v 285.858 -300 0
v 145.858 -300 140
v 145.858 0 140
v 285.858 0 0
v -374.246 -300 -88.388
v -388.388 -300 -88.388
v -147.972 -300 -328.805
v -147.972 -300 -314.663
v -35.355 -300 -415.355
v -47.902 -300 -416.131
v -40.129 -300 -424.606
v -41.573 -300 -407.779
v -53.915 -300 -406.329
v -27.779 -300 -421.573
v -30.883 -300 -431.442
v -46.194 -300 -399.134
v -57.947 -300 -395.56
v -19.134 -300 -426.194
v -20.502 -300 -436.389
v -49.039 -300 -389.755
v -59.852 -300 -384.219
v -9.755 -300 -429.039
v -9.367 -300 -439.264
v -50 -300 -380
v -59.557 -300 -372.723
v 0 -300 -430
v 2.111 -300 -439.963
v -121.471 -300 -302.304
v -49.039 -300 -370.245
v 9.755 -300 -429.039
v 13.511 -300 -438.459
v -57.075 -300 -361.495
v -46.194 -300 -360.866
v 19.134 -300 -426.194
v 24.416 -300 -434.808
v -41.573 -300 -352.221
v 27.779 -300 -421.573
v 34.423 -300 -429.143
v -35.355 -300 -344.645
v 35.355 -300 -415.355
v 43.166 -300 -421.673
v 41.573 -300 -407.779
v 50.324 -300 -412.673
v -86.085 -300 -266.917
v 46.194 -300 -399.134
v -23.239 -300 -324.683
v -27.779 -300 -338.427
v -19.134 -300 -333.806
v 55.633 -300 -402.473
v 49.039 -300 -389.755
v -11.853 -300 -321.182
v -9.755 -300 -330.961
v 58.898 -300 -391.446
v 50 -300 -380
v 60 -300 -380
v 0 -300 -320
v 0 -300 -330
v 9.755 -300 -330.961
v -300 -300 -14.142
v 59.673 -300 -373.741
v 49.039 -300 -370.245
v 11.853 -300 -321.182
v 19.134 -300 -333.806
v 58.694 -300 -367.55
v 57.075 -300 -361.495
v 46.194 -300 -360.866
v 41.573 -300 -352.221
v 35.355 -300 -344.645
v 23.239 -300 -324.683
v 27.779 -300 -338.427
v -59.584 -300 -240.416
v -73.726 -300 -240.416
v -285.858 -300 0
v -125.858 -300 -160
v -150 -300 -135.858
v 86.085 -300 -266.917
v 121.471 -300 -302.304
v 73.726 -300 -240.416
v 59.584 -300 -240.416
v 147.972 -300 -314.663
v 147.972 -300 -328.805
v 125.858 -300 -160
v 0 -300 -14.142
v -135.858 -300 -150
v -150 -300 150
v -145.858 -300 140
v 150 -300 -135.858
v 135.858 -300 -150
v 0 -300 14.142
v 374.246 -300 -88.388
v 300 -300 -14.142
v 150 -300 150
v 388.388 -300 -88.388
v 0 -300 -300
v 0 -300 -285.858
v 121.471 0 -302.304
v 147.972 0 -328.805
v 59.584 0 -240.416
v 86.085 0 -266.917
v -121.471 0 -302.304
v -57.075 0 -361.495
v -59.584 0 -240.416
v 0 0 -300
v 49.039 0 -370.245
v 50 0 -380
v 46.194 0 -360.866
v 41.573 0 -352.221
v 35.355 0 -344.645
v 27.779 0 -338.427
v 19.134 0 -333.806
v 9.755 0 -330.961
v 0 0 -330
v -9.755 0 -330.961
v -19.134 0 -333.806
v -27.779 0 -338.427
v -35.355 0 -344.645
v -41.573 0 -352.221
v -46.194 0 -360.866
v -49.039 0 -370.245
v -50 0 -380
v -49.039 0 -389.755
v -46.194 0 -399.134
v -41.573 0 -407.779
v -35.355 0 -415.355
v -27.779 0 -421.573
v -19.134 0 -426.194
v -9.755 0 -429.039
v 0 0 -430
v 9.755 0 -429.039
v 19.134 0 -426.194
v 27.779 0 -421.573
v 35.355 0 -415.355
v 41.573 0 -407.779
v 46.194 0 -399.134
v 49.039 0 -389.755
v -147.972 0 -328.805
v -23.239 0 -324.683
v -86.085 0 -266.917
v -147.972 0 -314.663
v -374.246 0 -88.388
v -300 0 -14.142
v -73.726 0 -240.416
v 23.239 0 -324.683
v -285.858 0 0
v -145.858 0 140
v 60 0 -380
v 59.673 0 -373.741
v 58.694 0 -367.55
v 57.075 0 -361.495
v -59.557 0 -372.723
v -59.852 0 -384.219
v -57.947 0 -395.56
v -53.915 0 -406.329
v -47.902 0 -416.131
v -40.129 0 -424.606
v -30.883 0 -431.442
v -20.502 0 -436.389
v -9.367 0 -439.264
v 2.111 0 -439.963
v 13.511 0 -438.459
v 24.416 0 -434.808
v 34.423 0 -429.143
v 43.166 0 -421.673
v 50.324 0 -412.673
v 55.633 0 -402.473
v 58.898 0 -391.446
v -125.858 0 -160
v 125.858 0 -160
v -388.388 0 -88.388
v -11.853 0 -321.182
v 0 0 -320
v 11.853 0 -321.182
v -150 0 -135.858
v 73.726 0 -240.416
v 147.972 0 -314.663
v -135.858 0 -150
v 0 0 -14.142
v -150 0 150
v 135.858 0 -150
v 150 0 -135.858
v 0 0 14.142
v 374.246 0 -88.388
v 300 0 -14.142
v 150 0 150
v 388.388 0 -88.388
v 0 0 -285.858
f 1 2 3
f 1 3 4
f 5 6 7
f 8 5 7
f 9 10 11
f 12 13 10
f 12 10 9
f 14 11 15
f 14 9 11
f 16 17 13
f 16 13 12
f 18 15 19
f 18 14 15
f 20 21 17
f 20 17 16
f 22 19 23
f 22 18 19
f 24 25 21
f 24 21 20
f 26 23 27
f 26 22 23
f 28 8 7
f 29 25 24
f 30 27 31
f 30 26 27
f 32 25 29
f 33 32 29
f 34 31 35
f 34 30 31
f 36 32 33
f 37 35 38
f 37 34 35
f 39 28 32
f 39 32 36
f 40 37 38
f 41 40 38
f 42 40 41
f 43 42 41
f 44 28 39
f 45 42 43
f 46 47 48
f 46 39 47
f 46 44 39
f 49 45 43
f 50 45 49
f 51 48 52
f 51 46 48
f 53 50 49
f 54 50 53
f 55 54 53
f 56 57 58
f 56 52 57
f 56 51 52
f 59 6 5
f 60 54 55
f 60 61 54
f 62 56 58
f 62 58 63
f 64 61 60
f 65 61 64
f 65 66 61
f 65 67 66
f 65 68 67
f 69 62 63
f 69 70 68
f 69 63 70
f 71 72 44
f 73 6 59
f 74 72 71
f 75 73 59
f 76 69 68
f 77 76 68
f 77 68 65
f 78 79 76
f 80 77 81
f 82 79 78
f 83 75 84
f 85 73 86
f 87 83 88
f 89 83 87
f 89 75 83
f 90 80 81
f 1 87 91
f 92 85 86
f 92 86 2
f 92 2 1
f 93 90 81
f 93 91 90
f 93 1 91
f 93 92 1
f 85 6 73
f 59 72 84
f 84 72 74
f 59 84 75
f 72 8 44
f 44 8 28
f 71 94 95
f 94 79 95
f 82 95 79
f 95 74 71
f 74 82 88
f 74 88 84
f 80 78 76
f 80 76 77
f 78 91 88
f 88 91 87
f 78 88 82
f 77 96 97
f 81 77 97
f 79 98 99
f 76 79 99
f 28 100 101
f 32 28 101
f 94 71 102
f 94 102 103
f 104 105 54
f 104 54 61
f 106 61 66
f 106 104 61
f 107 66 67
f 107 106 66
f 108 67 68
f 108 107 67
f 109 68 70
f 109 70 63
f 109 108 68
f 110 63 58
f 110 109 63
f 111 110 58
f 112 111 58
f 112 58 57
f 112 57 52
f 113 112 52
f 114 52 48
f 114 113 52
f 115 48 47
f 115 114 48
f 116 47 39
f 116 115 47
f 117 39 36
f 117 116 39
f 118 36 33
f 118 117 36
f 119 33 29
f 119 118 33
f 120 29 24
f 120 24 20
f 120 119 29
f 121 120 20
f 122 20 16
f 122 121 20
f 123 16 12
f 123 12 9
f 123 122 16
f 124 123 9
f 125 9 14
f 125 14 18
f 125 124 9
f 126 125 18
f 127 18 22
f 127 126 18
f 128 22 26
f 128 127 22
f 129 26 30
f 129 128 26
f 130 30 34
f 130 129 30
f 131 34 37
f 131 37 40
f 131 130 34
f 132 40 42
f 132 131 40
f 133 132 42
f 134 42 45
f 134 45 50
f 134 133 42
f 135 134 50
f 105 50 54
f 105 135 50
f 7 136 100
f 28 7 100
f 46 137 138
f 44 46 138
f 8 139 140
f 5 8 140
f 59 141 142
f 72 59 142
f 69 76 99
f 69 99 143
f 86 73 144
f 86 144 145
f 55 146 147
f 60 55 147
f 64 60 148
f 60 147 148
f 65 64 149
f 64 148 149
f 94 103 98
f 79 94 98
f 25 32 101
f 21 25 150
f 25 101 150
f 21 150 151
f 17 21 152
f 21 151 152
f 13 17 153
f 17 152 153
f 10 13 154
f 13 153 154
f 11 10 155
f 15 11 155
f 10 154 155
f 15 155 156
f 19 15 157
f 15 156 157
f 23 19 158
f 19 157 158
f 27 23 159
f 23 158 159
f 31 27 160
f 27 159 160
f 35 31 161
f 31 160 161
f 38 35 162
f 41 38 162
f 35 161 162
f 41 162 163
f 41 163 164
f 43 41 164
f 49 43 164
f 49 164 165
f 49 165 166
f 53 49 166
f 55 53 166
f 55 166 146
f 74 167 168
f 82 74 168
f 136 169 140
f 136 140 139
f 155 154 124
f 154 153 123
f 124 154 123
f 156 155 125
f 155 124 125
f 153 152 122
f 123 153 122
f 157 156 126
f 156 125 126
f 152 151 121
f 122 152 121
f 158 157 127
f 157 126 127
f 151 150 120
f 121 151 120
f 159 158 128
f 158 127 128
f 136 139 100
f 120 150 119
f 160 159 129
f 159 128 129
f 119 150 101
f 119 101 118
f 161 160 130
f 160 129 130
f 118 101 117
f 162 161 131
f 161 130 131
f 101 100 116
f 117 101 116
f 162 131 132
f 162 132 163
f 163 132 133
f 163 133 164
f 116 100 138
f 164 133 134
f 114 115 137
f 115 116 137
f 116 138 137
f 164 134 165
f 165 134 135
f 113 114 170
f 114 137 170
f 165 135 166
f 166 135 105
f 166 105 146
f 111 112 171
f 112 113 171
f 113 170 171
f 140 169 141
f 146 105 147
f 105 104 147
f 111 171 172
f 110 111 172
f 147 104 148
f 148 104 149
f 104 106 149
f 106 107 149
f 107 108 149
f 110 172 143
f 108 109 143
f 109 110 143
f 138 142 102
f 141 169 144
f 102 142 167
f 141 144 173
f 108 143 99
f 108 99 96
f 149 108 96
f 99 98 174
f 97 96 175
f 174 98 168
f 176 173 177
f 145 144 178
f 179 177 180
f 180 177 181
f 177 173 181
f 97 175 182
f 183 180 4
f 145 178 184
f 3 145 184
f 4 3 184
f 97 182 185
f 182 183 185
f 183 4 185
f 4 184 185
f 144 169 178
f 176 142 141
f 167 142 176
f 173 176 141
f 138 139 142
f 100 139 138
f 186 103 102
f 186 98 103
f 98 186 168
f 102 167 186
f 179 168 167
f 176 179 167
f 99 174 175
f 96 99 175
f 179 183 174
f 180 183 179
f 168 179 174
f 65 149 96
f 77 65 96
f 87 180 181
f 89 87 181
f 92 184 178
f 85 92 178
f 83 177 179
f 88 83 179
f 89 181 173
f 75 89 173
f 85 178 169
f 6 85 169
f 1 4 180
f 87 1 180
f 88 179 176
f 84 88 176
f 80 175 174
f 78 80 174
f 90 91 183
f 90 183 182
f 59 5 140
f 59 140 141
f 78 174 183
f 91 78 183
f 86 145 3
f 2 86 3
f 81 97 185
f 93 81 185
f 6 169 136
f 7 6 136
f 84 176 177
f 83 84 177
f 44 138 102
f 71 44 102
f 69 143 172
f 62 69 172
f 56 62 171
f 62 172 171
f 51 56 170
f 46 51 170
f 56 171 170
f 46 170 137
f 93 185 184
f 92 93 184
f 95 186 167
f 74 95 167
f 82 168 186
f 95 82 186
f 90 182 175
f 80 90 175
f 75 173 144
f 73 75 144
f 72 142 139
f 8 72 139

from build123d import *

# Parameters (mm, degrees)
F0_R     = 50
F1_DEPTH = 300


with BuildPart() as f1:
    # F0 (on Front) → F1 (new body)
    with BuildSketch(Plane.XZ):
        Polygon((-150, -150), (-300, 0), (-388.388348, -88.388348), (-147.972042, -328.804653), (-121.47121, -302.303821), (-86.084527, -266.917138), (-59.583694, -240.416306), align=None)
        Polygon((-374.246212, -88.388348), (-300, -14.142136), (-73.72583, -240.416306), (-147.972042, -314.662518), align=None, mode=Mode.SUBTRACT)
        Polygon((-150, 150), (-300, 0), (-150, -150), (0, 0), (150, -150), (225.000005, -74.999995), (300, 0), (150, 150), align=None)
        Polygon((0, 14.142136), (-150, -135.857864), (-285.857864, 0), (-145.857864, 140), (145.857864, 140), (285.857864, 0), (217.928937, -67.928927), (150, -135.857864), align=None, mode=Mode.SUBTRACT)
        Polygon((388.388348, -88.388348), (300, 0), (225.000005, -74.999995), (150, -150), (59.583694, -240.416306), (86.084527, -266.917138), (121.47121, -302.303821), (147.972042, -328.804653), align=None)
        Polygon((147.972042, -314.662518), (73.72583, -240.416306), (300, -14.142136), (374.246212, -88.388348), align=None, mode=Mode.SUBTRACT)
        with BuildLine():
            Line((-86.084527, -266.917138), (-121.47121, -302.303821))
            Line((-121.47121, -302.303821), (-57.075043, -361.494856))
            ThreePointArc((-57.075043, -361.494856), (-44.174127, -339.39646), (-23.238764, -324.683088))
            Line((-23.238764, -324.683088), (-86.084527, -266.917138))
        make_face()
        with BuildLine():
            ThreePointArc((-23.238764, -324.683088), (-44.174127, -339.39646), (-57.075043, -361.494856))
            ThreePointArc((-57.075043, -361.494856), (-9.367444, -439.264243), (59.999994, -379.999995))
            ThreePointArc((59.999994, -379.999995), (59.264243, -370.632559), (57.075032, -361.494859))
            ThreePointArc((57.075032, -361.494859), (44.174118, -339.396463), (23.238756, -324.68309))
            ThreePointArc((23.238756, -324.68309), (-4e-06, -319.999995), (-23.238764, -324.683088))
        make_face()
        with Locations((-6e-06, -379.999995)):
            Circle(F0_R, mode=Mode.SUBTRACT)
        with BuildLine():
            Line((121.47121, -302.303821), (86.084527, -266.917138))
            Line((86.084527, -266.917138), (23.238756, -324.68309))
            ThreePointArc((23.238756, -324.68309), (44.174118, -339.396463), (57.075032, -361.494859))
            Line((57.075032, -361.494859), (121.47121, -302.303821))
        make_face()
        Polygon((0, 0), (-150, -150), (-59.583694, -240.416306), (0, -300), (59.583694, -240.416306), (150, -150), align=None)
        Polygon((125.857864, -160), (0, -285.857864), (-125.857864, -160), (-135.857864, -150), (-67.928932, -82.071068), (0, -14.142136), (67.928932, -82.071068), (135.857864, -150), align=None, mode=Mode.SUBTRACT)
        Polygon((-135.857864, -150), (-125.857864, -160), (125.857864, -160), (135.857864, -150), align=None)
    extrude(amount=F1_DEPTH)


solid = f1.part
